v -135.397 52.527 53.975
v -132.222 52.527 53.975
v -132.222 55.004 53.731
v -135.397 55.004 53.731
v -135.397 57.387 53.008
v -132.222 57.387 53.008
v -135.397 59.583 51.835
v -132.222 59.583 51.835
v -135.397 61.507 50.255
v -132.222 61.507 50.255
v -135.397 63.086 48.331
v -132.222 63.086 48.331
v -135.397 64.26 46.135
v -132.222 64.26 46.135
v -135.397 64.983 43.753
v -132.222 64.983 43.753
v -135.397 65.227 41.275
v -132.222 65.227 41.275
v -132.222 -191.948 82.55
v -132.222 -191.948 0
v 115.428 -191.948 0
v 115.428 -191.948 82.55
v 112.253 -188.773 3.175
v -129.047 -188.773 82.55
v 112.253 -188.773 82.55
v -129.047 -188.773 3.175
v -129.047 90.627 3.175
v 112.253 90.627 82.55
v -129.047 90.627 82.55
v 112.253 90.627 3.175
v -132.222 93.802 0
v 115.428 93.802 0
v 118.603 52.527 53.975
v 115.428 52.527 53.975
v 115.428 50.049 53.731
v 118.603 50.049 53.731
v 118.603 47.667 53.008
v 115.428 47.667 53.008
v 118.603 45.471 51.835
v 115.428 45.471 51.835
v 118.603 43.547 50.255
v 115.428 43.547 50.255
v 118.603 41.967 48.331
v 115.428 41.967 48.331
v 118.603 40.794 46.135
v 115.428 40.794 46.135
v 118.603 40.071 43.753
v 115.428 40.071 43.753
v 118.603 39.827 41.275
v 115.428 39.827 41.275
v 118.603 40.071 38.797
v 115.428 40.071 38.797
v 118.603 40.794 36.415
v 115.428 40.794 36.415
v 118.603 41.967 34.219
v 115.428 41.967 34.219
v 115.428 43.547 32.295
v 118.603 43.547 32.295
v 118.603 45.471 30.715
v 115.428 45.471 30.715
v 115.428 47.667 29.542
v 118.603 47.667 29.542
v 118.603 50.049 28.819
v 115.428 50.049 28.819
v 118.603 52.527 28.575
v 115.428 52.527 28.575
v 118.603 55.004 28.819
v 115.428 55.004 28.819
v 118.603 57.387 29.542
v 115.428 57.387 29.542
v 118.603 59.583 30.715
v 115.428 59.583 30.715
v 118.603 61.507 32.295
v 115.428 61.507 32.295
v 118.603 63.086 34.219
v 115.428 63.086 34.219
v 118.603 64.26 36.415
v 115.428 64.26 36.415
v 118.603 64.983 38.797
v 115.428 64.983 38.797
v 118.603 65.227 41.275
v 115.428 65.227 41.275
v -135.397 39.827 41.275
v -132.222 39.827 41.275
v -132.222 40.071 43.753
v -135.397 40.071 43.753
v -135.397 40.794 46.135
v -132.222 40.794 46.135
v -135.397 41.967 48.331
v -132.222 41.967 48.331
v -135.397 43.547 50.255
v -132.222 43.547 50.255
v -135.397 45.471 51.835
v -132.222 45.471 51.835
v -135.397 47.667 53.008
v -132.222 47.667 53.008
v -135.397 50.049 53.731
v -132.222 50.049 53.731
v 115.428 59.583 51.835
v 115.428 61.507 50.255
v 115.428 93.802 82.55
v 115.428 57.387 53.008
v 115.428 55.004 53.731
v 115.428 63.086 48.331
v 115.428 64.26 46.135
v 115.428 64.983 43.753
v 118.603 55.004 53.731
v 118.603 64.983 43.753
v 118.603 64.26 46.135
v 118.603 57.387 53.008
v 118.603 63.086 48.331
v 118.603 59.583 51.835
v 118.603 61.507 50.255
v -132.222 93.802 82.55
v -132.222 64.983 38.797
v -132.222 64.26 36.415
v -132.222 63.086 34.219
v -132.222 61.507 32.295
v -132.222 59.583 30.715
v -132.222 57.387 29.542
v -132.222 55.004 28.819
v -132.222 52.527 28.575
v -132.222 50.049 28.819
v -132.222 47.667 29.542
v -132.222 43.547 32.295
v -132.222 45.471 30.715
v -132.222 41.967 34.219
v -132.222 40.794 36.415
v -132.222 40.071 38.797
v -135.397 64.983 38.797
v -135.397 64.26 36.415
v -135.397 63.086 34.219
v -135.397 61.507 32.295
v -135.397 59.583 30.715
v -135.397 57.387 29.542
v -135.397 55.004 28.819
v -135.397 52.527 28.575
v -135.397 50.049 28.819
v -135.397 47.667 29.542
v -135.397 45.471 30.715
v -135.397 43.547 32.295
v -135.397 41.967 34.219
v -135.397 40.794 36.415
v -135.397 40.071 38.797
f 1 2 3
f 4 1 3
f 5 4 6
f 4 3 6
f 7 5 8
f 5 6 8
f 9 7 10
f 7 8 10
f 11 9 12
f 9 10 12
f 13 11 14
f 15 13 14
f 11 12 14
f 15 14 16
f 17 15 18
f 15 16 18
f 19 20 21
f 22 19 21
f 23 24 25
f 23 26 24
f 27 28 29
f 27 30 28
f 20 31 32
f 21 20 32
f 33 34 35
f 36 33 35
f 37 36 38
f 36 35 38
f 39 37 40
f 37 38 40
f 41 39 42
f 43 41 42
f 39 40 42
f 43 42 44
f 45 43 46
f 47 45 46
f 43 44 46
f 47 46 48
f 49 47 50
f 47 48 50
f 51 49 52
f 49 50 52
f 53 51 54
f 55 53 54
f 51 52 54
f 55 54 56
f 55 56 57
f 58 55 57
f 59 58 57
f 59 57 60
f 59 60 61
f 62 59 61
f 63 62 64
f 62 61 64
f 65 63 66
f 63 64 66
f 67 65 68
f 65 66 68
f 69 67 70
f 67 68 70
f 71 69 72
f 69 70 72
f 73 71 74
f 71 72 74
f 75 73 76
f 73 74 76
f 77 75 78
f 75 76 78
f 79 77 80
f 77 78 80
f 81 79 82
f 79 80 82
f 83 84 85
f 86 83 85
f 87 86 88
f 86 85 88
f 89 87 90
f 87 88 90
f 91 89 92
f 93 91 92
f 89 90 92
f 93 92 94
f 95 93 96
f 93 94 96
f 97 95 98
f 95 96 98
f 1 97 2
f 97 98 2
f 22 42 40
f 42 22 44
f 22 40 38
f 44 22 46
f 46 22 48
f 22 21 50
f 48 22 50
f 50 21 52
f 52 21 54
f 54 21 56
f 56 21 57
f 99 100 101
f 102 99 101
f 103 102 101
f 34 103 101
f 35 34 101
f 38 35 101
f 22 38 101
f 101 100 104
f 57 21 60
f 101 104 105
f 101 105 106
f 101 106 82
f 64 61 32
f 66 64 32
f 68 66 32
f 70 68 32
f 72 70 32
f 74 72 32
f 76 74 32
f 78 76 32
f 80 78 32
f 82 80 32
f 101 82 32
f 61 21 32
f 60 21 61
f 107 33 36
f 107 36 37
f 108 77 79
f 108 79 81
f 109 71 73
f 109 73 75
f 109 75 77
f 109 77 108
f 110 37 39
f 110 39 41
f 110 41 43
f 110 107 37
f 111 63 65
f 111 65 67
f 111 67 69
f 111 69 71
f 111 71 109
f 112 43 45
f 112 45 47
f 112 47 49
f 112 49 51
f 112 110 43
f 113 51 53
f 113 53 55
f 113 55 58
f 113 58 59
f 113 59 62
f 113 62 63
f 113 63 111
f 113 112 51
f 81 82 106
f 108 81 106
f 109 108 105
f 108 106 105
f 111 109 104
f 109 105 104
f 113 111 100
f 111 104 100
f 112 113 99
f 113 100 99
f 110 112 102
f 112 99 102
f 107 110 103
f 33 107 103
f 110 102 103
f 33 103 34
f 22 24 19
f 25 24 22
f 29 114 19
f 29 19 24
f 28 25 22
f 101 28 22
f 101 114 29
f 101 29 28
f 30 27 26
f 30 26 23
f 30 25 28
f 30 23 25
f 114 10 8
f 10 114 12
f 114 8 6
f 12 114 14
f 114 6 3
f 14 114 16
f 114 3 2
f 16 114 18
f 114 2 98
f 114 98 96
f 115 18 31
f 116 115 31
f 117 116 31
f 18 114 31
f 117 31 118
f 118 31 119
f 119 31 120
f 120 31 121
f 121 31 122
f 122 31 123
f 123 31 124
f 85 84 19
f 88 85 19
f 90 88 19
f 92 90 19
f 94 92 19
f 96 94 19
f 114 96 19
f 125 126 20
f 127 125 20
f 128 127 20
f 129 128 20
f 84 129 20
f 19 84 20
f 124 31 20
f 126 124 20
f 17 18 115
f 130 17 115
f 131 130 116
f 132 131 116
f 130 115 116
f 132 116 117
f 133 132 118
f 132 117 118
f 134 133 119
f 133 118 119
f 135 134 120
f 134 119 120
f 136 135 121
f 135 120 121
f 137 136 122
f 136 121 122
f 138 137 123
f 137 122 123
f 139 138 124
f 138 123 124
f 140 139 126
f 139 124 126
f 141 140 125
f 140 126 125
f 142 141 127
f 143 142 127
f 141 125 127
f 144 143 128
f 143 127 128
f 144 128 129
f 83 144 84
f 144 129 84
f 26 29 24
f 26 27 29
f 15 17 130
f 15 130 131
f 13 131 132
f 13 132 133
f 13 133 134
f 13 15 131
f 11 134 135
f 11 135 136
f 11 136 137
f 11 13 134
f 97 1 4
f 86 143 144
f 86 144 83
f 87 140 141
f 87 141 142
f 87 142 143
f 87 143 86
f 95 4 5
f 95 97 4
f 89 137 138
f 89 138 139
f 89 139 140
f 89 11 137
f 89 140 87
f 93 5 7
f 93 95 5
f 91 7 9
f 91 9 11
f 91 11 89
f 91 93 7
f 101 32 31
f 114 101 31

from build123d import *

# Parameters (mm, degrees)
F1_DEPTH = 82.55
F2_T     = -3.175
F5_DEPTH = 3.175
F6_DEPTH = 3.175


with BuildPart() as f1:
    # F0 (on Top) → F1 (new body)
    with BuildSketch(Plane.XY):
        Polygon((-132.221535, 93.801795), (-132.221535, 90.626795), (-132.221535, -188.773205), (-132.221535, -191.948205), (115.428465, -191.948205), (115.428465, -188.773205), (115.428465, 93.801795), (112.253465, 93.801795), align=None)
    extrude(amount=F1_DEPTH)

    # F2
    f2_openings = [f1.faces().sort_by_distance(p)[0] for p in [
        (-8.396535, -49.073205, 82.55),
    ]]
    offset(amount=F2_T, openings=f2_openings)

    # F3 (on face) → F5 (join)
    with BuildSketch(Plane.YZ.offset(115.428465)):
        with BuildLine():
            ThreePointArc((52.526795, 53.975), (43.546539, 32.294744), (65.226795, 41.275))
            ThreePointArc((65.226795, 41.275), (61.507051, 50.255256), (52.526795, 53.975))
        make_face()
    extrude(amount=F5_DEPTH)

    # F4 (on face) → F6 (join)
    with BuildSketch(Plane(origin=(-132.221535, 0, 0), x_dir=(0, -1, 0), z_dir=(-1, 0, 0))):
        with BuildLine():
            ThreePointArc((-52.526795, 53.975), (-61.507051, 50.255256), (-65.226795, 41.275))
            ThreePointArc((-65.226795, 41.275), (-52.526795, 28.575), (-39.826795, 41.275))
            ThreePointArc((-39.826795, 41.275), (-43.546539, 50.255256), (-52.526795, 53.975))
        make_face()
    extrude(amount=F6_DEPTH)


solid = f1.part
